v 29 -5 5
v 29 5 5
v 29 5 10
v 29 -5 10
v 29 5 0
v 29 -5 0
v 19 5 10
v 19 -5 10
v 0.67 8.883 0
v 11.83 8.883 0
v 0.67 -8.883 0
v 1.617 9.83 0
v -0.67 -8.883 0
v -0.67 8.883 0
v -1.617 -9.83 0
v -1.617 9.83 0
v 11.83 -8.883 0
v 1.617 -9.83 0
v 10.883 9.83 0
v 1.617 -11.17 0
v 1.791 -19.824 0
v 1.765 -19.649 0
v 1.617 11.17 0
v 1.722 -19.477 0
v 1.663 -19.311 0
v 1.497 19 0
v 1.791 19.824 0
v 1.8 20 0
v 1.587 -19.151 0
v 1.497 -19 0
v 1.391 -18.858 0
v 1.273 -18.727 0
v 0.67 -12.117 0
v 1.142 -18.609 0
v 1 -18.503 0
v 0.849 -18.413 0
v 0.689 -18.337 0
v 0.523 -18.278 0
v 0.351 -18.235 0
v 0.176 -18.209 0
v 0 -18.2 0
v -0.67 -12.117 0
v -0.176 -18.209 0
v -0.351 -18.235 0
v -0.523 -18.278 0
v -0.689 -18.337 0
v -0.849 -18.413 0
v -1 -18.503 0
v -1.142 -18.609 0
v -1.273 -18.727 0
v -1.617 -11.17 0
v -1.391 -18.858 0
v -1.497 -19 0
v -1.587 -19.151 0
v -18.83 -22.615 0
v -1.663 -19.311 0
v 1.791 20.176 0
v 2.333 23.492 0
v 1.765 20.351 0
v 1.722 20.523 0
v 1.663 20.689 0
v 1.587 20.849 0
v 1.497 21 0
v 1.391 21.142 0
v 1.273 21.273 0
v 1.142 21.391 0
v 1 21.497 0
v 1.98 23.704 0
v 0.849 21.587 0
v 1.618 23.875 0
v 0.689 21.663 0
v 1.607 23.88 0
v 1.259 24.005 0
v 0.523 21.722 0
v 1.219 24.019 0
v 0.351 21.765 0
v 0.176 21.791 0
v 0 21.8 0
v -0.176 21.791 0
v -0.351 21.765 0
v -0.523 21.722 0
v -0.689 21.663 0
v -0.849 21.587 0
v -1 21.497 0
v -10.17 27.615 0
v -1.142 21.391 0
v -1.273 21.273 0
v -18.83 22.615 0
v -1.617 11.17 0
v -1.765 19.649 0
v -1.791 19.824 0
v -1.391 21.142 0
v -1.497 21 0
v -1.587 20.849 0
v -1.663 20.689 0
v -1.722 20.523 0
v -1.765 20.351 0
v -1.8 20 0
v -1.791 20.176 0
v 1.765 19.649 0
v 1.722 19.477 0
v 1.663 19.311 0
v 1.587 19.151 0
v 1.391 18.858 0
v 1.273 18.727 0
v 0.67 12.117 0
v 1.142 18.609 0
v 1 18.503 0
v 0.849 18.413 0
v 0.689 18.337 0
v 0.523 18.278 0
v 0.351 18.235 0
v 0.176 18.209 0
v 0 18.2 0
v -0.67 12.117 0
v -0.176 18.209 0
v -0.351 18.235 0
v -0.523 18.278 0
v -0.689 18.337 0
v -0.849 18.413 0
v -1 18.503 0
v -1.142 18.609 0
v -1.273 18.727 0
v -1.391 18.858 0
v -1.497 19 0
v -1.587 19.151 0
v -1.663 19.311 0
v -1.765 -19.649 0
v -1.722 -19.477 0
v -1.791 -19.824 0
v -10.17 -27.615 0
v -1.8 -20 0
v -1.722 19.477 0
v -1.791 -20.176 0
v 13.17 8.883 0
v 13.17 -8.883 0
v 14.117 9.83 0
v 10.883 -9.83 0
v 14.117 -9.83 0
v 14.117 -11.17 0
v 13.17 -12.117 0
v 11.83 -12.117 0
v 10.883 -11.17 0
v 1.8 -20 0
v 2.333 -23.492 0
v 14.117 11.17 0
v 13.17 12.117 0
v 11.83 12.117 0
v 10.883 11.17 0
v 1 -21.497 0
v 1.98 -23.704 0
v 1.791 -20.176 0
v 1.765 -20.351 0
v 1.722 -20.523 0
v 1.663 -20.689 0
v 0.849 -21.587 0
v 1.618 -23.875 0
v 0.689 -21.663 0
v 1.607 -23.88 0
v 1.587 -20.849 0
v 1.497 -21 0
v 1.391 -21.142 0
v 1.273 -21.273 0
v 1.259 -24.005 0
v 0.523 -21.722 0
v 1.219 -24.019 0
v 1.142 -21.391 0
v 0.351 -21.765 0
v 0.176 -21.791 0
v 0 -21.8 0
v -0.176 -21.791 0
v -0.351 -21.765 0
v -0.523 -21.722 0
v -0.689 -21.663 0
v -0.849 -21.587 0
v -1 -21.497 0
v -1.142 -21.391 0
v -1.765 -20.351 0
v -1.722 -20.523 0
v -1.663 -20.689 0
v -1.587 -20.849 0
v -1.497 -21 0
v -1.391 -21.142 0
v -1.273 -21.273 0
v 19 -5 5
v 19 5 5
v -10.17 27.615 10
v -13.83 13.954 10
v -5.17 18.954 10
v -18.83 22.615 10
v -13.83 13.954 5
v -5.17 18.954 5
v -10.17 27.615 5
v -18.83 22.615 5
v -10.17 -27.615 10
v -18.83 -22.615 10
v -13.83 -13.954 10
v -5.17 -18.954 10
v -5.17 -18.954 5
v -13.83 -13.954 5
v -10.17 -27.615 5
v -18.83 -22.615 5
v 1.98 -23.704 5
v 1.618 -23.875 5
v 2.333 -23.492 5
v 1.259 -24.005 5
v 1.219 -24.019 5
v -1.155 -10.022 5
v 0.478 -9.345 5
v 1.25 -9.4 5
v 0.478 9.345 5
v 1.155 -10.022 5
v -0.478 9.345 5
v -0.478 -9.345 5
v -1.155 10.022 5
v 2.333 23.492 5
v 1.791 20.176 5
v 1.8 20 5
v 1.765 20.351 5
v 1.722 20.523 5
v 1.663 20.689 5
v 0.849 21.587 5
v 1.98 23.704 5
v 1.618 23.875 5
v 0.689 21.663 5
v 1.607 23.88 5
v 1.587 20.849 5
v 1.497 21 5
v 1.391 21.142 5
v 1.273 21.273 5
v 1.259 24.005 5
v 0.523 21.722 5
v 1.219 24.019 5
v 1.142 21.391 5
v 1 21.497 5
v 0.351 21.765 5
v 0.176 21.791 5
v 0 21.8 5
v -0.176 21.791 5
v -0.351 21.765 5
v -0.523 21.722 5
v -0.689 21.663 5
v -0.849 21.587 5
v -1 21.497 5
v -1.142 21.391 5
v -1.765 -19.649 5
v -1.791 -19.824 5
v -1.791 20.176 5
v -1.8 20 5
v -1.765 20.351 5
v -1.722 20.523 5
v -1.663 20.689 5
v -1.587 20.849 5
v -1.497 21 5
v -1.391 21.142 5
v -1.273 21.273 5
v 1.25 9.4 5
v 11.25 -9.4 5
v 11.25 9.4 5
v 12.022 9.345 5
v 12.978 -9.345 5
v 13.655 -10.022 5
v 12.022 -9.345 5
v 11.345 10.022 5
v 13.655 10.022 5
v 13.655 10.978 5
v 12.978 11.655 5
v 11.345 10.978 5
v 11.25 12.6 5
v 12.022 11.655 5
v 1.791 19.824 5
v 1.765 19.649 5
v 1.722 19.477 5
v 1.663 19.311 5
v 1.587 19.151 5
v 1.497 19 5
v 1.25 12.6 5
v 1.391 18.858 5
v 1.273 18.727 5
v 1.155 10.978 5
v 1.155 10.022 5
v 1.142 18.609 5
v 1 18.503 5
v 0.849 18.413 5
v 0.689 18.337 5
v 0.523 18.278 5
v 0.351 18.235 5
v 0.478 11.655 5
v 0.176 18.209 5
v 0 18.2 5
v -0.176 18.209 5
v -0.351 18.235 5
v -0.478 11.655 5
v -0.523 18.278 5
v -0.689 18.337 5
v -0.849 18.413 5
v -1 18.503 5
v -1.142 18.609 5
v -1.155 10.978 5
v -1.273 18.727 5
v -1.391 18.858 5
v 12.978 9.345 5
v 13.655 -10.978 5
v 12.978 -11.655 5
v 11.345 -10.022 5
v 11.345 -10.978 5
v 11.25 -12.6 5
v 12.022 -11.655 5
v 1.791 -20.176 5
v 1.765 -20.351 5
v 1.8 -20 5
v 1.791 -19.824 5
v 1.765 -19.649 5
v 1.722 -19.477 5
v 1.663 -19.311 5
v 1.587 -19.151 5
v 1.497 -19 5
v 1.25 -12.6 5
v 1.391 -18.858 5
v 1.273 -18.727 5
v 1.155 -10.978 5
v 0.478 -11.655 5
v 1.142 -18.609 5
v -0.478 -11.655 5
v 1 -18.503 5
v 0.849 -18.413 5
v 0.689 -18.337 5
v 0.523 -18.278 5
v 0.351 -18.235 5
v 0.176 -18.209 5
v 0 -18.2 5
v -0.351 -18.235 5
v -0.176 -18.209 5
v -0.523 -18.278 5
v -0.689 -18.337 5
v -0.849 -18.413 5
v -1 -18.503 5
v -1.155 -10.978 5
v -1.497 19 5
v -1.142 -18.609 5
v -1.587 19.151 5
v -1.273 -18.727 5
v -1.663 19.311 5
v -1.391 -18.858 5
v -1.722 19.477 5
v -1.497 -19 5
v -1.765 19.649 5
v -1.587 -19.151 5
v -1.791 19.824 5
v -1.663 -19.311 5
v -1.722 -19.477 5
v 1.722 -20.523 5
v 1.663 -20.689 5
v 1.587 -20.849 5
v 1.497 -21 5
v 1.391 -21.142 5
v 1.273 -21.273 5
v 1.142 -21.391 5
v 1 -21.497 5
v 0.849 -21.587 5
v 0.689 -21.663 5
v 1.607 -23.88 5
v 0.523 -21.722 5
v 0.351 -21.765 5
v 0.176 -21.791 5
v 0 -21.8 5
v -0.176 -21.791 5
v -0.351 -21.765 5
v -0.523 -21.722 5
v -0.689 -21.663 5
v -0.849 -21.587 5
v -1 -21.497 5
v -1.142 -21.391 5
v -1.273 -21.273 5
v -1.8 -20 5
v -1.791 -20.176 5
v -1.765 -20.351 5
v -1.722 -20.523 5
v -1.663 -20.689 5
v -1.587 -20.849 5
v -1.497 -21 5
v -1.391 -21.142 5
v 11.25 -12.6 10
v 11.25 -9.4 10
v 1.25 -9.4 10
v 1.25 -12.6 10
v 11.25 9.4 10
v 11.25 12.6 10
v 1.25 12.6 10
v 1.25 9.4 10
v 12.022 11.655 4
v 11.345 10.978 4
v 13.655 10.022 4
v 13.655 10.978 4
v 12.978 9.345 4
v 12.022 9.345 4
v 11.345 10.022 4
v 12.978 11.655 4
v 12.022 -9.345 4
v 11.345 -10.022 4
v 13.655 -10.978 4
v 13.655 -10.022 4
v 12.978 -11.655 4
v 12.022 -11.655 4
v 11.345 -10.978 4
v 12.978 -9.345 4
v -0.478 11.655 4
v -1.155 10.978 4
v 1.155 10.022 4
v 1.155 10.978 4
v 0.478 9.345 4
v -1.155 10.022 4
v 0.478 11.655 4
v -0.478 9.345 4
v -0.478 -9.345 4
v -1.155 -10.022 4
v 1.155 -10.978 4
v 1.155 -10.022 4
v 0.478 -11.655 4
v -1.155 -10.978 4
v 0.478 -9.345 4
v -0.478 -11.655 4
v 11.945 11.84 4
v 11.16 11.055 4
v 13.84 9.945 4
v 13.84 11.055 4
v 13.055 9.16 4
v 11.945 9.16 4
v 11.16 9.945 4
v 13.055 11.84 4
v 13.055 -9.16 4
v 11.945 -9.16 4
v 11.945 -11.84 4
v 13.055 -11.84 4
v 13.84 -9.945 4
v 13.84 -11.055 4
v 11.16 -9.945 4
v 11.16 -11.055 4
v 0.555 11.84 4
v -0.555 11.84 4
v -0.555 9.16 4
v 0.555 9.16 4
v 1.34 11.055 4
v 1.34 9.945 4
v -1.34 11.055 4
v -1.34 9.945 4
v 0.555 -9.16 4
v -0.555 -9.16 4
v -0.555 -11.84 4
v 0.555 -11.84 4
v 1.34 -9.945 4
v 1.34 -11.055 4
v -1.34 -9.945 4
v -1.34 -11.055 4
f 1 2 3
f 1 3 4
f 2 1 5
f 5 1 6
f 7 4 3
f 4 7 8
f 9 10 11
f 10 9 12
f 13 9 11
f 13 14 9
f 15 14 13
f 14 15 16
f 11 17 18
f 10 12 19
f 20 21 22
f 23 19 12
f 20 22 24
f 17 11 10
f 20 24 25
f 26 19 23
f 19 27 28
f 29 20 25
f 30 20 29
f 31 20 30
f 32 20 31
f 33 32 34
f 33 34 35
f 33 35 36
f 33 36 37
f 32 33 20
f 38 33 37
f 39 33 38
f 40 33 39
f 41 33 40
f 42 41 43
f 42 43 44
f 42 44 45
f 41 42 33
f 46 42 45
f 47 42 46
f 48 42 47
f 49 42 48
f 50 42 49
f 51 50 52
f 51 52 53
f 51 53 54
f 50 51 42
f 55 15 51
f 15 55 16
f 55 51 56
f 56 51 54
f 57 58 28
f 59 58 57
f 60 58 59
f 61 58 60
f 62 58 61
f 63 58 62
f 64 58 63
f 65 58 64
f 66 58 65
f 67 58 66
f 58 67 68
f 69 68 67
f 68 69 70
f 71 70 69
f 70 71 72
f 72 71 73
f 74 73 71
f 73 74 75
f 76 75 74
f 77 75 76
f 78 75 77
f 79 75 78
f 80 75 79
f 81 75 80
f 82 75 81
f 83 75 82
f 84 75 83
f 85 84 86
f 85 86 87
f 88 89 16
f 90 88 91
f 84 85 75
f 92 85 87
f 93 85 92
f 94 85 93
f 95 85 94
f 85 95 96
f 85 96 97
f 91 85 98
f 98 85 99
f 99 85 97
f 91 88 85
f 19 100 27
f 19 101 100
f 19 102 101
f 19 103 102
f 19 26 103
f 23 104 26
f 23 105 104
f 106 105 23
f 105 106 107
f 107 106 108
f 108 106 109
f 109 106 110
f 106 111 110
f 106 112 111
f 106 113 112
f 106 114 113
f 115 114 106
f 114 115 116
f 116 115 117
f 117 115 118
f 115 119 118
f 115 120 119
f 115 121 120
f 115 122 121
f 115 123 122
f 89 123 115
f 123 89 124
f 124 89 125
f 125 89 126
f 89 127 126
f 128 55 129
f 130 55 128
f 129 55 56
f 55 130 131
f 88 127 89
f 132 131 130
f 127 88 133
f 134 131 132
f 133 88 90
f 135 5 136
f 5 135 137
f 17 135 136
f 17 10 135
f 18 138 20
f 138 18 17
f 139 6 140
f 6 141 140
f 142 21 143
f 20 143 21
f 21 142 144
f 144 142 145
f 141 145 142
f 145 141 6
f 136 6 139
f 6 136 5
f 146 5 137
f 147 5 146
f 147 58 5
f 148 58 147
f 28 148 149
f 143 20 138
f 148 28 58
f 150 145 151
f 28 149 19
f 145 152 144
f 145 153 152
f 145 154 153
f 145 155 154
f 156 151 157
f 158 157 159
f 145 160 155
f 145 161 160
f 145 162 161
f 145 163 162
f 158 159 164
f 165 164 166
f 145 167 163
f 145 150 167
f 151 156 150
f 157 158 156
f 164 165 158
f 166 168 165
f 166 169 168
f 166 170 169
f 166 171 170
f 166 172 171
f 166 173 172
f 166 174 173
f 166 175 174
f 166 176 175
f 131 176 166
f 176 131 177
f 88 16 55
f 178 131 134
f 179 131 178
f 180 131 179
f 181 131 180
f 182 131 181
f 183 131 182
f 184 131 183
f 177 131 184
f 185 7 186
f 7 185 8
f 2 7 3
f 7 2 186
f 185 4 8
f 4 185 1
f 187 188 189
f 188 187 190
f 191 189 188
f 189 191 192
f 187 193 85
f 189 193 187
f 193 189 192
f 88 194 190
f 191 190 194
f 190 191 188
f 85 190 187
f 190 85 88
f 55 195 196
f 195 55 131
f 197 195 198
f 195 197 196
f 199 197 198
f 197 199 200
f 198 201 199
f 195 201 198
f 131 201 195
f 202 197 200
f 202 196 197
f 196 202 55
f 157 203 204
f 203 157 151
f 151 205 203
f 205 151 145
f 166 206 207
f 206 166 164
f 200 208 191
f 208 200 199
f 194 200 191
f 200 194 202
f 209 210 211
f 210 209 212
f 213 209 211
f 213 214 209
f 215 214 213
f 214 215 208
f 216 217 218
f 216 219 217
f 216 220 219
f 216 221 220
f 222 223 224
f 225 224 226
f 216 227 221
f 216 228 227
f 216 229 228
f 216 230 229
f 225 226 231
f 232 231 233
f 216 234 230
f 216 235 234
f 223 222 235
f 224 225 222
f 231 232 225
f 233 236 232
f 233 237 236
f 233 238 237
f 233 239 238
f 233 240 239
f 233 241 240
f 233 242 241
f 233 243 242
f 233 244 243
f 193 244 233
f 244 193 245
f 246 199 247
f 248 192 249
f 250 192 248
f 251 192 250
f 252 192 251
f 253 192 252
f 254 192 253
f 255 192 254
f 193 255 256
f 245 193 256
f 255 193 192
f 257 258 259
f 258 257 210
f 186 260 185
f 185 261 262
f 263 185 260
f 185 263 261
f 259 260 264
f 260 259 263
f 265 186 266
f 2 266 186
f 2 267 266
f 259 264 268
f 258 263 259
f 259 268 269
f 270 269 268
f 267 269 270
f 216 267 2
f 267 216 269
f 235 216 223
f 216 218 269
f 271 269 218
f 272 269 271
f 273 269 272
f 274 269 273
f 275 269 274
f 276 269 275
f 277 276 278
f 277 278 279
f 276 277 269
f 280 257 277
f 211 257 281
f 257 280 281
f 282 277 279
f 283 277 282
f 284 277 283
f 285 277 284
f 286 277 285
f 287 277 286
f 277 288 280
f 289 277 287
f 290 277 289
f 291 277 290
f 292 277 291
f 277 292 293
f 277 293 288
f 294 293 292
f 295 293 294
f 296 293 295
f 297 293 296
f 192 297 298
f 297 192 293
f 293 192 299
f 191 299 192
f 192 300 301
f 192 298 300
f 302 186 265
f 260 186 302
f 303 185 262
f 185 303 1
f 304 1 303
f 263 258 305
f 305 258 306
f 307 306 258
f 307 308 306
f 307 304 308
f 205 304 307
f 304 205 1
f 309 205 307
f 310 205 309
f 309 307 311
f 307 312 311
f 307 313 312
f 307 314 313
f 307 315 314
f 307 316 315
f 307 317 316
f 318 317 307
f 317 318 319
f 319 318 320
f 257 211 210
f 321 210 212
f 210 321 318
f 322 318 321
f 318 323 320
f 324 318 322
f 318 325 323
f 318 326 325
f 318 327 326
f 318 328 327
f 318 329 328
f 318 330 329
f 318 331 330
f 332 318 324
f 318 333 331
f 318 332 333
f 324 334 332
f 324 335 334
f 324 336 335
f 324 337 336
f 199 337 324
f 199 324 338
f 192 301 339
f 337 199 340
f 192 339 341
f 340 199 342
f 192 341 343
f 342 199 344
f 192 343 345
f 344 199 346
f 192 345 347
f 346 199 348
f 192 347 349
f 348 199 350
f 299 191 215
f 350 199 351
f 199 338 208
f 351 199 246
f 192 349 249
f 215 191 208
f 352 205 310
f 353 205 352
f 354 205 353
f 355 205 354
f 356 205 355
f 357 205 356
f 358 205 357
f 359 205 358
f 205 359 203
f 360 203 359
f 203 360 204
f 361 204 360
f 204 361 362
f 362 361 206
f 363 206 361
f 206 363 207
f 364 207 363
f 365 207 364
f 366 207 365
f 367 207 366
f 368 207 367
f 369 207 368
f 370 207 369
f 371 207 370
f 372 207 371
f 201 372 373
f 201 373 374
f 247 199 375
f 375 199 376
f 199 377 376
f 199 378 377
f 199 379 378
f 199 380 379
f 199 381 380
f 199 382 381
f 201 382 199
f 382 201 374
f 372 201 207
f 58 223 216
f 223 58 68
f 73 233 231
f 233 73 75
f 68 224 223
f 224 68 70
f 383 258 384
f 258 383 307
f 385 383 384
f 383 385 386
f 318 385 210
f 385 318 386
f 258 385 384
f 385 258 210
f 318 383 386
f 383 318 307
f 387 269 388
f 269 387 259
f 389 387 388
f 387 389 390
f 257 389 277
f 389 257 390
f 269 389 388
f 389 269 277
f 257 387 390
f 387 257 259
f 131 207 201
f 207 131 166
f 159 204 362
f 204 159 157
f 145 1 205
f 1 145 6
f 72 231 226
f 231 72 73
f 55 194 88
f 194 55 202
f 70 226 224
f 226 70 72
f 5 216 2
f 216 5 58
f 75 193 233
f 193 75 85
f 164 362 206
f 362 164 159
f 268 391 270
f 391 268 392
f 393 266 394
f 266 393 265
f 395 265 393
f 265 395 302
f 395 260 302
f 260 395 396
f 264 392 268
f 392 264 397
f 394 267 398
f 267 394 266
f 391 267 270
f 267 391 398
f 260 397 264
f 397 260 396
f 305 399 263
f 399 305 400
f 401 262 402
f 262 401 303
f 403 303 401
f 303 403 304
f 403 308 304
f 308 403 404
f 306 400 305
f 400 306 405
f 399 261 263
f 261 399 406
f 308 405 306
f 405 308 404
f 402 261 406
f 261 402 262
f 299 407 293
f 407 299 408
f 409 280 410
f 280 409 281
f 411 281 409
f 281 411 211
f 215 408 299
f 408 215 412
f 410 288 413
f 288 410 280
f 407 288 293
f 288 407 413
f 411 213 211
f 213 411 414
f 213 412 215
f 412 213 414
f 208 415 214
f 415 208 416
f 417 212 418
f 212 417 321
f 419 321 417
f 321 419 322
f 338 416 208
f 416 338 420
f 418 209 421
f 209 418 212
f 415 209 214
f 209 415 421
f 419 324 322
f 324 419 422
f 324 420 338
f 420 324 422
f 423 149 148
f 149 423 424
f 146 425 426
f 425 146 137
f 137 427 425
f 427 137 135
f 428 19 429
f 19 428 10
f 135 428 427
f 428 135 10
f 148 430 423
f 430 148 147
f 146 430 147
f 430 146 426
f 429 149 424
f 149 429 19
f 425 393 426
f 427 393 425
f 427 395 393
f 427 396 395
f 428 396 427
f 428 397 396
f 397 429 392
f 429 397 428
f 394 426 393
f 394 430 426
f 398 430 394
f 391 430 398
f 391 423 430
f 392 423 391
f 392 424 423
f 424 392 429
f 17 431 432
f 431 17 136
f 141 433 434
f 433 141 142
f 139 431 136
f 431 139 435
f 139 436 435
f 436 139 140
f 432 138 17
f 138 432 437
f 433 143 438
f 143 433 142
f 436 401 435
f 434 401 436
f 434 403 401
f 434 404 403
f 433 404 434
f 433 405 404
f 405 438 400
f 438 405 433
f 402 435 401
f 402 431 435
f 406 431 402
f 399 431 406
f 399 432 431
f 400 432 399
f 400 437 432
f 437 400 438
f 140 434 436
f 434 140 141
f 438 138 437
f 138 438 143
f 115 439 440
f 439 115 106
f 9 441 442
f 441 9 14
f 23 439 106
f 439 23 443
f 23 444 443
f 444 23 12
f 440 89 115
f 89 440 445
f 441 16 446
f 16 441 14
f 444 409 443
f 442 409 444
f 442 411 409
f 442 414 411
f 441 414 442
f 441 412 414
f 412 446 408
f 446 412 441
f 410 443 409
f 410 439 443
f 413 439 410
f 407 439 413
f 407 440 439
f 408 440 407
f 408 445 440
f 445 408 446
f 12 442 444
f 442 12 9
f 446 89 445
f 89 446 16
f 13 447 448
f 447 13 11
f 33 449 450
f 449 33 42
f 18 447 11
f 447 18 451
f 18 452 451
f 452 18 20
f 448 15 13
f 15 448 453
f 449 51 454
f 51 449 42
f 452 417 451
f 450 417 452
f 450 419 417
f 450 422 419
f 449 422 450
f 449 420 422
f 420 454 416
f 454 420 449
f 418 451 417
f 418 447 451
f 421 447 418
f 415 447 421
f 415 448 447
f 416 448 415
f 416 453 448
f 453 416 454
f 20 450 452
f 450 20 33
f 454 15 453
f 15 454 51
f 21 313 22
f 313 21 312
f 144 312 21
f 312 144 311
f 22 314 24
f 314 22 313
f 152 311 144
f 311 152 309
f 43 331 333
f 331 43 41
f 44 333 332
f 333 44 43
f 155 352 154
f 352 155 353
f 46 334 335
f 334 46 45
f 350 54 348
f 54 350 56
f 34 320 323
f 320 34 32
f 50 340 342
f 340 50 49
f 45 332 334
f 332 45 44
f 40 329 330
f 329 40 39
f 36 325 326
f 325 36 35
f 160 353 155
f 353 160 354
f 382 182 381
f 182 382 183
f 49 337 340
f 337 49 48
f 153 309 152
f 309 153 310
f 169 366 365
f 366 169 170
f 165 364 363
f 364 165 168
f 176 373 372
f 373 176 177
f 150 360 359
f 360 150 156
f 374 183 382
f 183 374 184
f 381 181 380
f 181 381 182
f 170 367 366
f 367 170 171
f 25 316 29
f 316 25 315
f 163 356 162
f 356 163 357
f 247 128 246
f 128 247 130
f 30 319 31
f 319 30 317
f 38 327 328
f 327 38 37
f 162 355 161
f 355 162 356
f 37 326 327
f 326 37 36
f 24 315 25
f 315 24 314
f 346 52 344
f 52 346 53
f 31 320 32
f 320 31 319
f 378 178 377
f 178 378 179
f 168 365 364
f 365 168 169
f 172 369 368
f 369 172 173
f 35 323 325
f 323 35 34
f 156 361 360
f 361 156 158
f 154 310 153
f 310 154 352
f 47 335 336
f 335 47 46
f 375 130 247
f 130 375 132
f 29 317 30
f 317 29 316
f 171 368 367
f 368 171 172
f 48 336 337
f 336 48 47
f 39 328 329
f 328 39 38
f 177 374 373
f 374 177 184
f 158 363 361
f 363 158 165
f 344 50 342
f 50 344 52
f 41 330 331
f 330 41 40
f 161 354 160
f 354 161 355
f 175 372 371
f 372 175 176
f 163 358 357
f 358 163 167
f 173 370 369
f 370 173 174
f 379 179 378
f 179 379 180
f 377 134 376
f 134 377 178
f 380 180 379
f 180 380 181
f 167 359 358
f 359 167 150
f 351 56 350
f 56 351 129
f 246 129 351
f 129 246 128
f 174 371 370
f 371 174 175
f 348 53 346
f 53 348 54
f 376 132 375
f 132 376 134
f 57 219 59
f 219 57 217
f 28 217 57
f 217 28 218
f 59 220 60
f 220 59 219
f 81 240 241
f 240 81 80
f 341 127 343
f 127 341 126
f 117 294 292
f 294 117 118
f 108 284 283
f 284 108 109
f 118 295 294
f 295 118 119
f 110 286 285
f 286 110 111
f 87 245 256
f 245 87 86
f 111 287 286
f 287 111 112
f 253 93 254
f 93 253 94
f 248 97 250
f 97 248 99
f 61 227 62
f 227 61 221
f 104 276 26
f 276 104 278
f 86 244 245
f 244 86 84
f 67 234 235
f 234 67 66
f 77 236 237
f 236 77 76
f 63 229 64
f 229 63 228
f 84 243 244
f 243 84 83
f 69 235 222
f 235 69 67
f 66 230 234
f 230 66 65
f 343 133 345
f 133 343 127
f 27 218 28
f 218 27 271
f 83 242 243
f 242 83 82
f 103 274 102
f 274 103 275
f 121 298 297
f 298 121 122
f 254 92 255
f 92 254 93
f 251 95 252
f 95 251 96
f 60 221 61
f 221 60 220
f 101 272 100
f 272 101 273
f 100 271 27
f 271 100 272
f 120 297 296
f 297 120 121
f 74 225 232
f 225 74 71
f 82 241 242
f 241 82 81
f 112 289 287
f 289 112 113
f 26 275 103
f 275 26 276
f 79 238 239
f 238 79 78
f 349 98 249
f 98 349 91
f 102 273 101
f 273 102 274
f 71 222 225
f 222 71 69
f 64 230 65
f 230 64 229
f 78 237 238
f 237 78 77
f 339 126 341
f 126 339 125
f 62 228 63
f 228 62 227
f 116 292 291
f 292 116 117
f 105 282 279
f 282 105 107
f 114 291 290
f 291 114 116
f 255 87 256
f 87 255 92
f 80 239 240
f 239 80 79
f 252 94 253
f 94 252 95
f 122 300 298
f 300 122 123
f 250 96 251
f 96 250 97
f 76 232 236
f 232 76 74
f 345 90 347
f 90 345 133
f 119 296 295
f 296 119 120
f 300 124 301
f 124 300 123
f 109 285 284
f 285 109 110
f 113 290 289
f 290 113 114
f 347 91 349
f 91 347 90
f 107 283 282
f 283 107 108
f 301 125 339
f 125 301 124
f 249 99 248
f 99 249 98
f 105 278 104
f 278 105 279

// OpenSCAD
/* 
 * mounts upward-facing raspberry pi camera 
 * and led ringlight on cnc bed. 
 */
 
inch = 25.4;
eps = 0.001;
eps2 = 0.002;
inf = 10000;
nozzle_width=0.4;
$fn=64;

floor_z = 5.0;

camera_y = 21.0;
camera_x = 12.5;
camera_z = floor_z+5.0;

ringlight_d1 = 48;
ringlight_h  = 10;

screw_dist = 40;

module up_facing_camera() {
    difference() {
        up_facing_camera_body();
        up_facing_camera_holes();
    }
}

module up_facing_camera_body() {
    ringlight();
    camera_body();
    floor();
}

module up_facing_camera_holes() {
    camera_holes();
    screw_holes();
}

module camera_screw_positions() {
    rotate([0,0,-90])
    {
        translate([-camera_y/2, +camera_x,0])
        children();
        translate([+camera_y/2, +camera_x,0])
        children();
        translate([-camera_y/2, 0,0])
        children();
        translate([+camera_y/2, 0,0])
        children();
    }
}

module camera_body() {
    translate([camera_x/2,-camera_y/2-0.5,camera_z/2])
    cube([camera_x-2.5,3.2,camera_z],center=true);
    translate([camera_x/2,camera_y/2+0.5,camera_z/2])
    cube([camera_x-2.5,3.2,camera_z],center=true);
    screw_body();
}

module camera_holes() {
    camera_screw_positions()
    rotate([0,0,180/8])
    cylinder(d=2.5,h=50.0,$fn=8,center=true);
    camera_screw_positions()
    mirror([0,0,1])
    m2_heat_set_insert();
}

/* m3 heat set insert
 * 6.0 mm high
 * dia top 5.0 mm
 * dia bottom 4.0 mm
 * cone 8 degree taper angle, from 4.0mm - 0.2 mm = 3.8mm, height = 6.0 mm
 */

module m3_heat_set_insert() {
    hull() {
        rotate([0,0,180/8])
        cylinder(d=5.5,h=0.1,$fn=8);
        translate([0,0,-6])
        rotate([0,0,180/8])
        cylinder(d=3.8,h=0.1,$fn=8);
    }
}

// M2 X D3.6 X L4.0
// 4.0 mm high
// dia top 3.6 mm
// dia bottom 3.1 mm

module m2_heat_set_insert() {
    hull() {
        rotate([0,0,180/8])
        cylinder(d=3.5,h=0.1,$fn=8);
        translate([0,0,-4])
        rotate([0,0,180/8])
        cylinder(d=2.9,h=0.1,$fn=8);
    }
}

module ringlight() {
    for(alpha=[0:120:360])
        rotate([0,0,alpha])
        translate([ringlight_d1/2, 0, ringlight_h/2])
        cube(ringlight_h, center=true);
}

module floor() {
    linear_extrude(floor_z)
    hull()
    projection() {
        ringlight();
        camera_body();
    }
}

module screw_body() {
    translate([0,-screw_dist/2,0])
    cylinder(d=8.0+nozzle_width,h=floor_z);
    translate([0,screw_dist/2,0])
    cylinder(d=8.0+nozzle_width,h=floor_z);
}

module screw_holes() {
    translate([0,-screw_dist/2,0])
    cylinder(d=3.2+nozzle_width,h=3*floor_z,center=true);
    translate([0,screw_dist/2,0])
    cylinder(d=3.2+nozzle_width,h=3*floor_z,center=true);
}

up_facing_camera();
//camera_holes();
//ringlight();
//floor();
